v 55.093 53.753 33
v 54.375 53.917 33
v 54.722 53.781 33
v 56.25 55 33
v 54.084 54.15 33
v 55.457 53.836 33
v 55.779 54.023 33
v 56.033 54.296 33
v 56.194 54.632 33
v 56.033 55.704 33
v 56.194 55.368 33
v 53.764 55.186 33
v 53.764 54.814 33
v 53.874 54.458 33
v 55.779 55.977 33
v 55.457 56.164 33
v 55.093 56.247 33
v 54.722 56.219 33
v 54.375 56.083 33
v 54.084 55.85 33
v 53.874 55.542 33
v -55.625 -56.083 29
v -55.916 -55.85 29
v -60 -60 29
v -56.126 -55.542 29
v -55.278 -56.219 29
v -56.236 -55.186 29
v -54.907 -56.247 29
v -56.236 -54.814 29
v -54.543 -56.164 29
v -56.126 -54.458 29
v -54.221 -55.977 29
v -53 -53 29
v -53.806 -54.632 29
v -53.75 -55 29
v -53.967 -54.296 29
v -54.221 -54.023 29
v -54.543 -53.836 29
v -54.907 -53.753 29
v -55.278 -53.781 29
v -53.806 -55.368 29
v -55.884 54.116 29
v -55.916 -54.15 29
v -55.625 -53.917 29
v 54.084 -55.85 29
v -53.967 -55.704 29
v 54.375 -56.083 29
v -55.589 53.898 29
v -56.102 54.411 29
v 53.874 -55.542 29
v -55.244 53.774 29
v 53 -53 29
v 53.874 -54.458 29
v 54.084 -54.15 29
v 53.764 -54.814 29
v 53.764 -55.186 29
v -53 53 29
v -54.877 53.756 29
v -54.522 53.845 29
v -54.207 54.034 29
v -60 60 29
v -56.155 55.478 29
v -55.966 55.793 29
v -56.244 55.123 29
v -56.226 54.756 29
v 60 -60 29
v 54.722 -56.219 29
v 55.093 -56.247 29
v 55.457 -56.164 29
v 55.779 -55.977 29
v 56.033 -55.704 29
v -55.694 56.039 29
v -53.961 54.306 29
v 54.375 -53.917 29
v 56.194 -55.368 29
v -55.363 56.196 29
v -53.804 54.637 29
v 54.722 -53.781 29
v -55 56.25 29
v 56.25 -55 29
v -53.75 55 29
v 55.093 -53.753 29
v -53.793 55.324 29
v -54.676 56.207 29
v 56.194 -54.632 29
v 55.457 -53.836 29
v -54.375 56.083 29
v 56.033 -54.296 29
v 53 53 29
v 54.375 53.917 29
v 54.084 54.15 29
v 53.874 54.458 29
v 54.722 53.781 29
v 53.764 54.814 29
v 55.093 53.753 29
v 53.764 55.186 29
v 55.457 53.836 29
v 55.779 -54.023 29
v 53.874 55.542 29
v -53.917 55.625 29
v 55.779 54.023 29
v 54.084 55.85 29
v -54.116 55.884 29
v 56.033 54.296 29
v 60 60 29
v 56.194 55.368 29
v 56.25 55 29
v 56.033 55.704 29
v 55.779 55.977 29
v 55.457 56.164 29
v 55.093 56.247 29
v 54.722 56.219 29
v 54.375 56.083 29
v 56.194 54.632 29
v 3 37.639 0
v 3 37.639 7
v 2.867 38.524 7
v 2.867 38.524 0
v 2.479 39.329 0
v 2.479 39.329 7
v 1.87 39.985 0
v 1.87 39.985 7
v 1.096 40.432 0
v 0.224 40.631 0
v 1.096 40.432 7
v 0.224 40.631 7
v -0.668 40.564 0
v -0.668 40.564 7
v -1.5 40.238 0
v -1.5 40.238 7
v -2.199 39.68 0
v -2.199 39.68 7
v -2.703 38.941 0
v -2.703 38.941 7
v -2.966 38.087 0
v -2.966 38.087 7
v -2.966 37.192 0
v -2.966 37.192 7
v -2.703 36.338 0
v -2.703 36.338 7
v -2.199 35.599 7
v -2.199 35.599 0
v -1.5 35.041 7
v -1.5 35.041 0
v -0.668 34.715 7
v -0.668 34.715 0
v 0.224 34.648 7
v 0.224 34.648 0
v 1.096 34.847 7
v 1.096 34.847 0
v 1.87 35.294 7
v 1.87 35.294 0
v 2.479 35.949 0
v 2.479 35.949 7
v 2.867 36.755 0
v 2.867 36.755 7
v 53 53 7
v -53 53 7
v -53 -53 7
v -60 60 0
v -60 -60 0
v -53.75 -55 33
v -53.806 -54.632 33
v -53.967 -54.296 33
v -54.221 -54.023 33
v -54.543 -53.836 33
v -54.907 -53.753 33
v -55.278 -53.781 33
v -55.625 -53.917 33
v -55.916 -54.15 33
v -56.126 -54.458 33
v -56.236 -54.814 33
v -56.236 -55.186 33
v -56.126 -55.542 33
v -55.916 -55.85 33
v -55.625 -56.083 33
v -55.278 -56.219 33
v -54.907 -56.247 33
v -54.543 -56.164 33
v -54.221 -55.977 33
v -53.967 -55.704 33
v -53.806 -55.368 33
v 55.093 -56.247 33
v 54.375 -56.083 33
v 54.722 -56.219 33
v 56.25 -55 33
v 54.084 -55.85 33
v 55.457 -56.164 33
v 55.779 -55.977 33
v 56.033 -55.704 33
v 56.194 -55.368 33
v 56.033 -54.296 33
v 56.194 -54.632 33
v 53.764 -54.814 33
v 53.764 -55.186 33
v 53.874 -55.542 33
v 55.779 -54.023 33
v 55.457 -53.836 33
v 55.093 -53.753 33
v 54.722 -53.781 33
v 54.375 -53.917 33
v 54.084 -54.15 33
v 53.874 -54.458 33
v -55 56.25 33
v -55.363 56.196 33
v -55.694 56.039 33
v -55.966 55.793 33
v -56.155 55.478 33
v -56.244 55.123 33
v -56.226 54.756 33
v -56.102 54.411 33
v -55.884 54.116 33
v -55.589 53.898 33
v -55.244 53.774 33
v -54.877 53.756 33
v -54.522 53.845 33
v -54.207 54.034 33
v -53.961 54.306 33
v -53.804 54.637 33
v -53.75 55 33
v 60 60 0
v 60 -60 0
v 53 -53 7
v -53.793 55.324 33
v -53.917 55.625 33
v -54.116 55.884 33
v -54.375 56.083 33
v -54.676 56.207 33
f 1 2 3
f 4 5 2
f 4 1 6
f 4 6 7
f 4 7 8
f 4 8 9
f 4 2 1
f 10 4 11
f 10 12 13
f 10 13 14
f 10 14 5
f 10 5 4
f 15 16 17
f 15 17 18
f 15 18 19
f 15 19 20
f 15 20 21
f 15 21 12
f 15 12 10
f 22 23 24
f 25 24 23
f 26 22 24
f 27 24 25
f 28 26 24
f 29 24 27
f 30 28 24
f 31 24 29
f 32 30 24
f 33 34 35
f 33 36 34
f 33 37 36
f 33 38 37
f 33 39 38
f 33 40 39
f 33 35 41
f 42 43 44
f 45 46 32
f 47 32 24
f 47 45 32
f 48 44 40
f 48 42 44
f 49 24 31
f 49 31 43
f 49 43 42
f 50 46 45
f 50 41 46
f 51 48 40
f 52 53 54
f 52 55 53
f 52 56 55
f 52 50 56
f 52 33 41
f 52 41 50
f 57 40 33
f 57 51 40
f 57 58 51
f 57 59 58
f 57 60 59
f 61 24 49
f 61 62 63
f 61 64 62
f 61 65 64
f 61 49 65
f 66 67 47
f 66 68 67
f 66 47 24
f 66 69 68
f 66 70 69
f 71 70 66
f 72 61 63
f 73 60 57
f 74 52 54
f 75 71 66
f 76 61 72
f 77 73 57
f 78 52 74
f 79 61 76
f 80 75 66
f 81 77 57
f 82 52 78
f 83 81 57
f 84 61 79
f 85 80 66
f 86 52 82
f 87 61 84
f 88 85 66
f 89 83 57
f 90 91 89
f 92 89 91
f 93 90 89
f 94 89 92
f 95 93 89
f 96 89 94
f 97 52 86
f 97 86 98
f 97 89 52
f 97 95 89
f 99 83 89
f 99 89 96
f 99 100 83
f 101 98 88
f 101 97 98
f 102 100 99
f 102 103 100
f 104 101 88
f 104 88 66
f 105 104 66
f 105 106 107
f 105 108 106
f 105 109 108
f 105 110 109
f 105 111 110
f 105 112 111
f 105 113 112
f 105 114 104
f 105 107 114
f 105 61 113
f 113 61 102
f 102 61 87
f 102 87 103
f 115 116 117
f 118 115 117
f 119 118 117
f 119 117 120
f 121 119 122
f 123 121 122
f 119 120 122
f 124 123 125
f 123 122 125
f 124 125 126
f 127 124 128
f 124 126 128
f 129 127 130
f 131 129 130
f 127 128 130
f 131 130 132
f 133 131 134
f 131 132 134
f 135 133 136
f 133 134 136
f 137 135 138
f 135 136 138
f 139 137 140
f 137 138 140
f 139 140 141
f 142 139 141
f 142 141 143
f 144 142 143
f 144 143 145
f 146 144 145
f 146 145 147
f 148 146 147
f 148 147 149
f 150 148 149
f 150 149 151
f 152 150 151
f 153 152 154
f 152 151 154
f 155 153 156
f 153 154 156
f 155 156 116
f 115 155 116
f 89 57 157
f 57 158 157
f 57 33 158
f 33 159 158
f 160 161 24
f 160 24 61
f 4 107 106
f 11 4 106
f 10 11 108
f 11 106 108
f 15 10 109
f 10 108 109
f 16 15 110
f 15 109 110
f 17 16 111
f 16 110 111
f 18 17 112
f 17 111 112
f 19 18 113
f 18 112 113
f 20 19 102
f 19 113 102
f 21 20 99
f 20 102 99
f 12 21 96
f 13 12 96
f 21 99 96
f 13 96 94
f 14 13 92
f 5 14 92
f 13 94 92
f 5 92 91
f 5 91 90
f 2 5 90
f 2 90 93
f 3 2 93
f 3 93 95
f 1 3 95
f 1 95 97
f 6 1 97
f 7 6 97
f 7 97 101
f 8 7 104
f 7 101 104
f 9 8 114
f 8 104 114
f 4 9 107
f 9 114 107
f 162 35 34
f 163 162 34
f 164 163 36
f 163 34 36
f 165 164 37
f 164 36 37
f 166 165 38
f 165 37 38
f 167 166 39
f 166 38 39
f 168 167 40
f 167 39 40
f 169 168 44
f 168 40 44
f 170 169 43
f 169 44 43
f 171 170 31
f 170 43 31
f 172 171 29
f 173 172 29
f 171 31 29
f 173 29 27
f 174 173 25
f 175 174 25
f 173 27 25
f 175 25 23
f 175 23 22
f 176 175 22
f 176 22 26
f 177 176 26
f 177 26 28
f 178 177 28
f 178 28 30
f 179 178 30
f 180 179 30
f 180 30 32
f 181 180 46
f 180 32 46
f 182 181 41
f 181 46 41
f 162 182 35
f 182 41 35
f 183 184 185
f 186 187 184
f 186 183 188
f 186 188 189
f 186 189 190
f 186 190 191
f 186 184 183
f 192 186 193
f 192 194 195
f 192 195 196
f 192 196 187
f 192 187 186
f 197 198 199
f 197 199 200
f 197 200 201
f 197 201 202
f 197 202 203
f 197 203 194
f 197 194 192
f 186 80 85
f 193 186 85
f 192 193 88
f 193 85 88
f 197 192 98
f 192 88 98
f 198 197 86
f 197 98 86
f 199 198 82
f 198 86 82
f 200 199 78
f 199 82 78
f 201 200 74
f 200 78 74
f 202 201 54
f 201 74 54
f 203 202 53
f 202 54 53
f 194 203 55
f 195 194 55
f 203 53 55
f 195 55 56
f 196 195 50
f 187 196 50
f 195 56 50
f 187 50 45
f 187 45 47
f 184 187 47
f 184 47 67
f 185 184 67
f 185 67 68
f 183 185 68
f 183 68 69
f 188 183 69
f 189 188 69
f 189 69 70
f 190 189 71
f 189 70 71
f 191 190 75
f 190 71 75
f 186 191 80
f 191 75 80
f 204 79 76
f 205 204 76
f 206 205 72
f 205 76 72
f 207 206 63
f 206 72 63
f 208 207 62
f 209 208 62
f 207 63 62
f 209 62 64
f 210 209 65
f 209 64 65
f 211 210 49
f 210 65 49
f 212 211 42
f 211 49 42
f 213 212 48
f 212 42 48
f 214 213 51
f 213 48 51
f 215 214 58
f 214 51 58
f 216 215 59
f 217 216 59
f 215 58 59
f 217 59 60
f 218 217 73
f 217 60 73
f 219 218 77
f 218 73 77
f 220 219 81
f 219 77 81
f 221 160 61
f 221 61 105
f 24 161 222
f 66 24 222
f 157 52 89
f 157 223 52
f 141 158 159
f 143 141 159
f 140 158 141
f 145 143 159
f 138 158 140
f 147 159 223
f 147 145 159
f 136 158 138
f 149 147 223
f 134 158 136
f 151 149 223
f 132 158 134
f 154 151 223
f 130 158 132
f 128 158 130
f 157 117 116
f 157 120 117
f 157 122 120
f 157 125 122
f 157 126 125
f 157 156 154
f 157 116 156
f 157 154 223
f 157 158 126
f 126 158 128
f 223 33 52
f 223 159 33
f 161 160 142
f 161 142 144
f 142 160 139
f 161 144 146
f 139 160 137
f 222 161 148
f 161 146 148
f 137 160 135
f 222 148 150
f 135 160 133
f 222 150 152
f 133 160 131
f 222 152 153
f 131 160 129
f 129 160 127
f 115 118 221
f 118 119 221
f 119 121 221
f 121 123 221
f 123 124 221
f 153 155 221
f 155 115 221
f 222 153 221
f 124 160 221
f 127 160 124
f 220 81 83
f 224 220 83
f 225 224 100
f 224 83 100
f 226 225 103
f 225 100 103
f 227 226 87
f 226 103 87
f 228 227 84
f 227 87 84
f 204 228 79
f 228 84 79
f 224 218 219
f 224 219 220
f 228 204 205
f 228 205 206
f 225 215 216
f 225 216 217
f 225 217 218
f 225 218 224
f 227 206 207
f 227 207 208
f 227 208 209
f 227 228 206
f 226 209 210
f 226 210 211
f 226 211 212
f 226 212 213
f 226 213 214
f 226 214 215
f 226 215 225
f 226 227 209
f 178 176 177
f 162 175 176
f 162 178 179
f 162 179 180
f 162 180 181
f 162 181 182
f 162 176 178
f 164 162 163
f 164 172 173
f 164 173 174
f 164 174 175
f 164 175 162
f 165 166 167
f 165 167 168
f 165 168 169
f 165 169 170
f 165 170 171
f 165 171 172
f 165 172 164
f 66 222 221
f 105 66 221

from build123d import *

# Parameters (mm, degrees)
F0_W     = 120
F0_H     = 120
F1_DEPTH = 29
F2_T     = -7
F3_R     = 1.25
F4_DEPTH = 4
F5_R     = 3
F6_DEPTH = 7


with BuildPart() as f1:
    # F0 (on Top) → F1 (new body)
    with BuildSketch(Plane.XY):
        Rectangle(F0_W, F0_H)
    extrude(amount=F1_DEPTH)

    # F2
    f2_openings = [f1.faces().sort_by_distance(p)[0] for p in [
        (0, 0, 29),
    ]]
    offset(amount=F2_T, openings=f2_openings)

    # F3 (on face) → F4 (join)
    with BuildSketch(Plane.XY.offset(29)):
        with BuildLine():
            ThreePointArc((-55, 56.25), (-55.883883, 54.116117), (-53.75, 55))
            ThreePointArc((-53.75, 55), (-54.116117, 55.883883), (-55, 56.25))
        make_face()
        with Locations((55, 55)):
            Circle(F3_R)
        with Locations((55, -55)):
            Circle(F3_R)
        with Locations((-55, -55)):
            Circle(F3_R)
    extrude(amount=F4_DEPTH)

    # F5 (on face) → F6 (cut)
    with BuildSketch(Plane.XY.offset(7)):
        with Locations((0, 37.63944)):
            Circle(F5_R)
    extrude(amount=-F6_DEPTH, mode=Mode.SUBTRACT)


solid = f1.part
